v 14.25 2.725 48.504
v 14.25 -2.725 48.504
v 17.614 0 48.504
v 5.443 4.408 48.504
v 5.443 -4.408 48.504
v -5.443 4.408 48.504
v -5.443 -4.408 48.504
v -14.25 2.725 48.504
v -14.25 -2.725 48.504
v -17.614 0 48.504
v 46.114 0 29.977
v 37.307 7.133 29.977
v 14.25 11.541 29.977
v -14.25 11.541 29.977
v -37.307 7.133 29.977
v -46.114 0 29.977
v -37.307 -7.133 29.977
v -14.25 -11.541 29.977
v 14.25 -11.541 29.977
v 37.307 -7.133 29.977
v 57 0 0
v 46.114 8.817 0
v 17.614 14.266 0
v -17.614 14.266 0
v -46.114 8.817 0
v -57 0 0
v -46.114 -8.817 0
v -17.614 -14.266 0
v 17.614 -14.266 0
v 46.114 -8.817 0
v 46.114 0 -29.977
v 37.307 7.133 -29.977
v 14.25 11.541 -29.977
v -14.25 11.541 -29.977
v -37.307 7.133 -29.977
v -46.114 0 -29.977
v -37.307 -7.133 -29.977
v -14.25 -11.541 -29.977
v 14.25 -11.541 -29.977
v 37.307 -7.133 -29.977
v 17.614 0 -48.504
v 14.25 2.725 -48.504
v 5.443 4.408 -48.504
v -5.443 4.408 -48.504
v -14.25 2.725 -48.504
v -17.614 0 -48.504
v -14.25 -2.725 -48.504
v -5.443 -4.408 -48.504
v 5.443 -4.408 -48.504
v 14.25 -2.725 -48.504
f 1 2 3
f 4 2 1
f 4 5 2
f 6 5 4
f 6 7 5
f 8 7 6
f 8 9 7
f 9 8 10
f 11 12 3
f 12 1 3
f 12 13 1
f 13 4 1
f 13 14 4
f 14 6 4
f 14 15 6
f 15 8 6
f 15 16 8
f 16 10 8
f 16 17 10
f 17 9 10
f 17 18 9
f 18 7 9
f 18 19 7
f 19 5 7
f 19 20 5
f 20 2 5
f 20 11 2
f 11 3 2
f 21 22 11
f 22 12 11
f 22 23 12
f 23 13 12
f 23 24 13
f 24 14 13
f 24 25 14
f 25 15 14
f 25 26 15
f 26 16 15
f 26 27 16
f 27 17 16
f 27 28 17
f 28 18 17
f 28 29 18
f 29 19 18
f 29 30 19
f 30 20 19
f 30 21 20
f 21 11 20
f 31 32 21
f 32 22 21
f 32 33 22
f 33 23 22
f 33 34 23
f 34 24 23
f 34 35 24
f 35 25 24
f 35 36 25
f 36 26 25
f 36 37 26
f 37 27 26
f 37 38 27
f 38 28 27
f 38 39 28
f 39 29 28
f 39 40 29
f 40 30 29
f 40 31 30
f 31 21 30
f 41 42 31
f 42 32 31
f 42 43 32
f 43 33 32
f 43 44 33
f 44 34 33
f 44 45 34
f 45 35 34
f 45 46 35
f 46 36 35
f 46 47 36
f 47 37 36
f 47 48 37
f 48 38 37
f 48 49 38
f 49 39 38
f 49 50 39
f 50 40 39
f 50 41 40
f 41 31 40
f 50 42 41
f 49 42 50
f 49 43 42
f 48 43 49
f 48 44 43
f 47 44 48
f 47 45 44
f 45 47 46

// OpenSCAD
// Generated by SolidPython 1.0.1 on 2020-07-29 00:46:53


scale(v = [19, 5, 17]) {
	sphere(r = 3);
}
/***********************************************
*********      SolidPython code:      **********
************************************************
 
# import packages: SolidPython
from solid import *
from solid.utils import *
from itertools import chain, combinations, permutations


class Resize:

    def __init__(self, scad_file):
        self.scad_file = scad_file
        #self.scad_file = import_scad(scad_file)
        # cone/cylinder param:
        self.r1 = 0
        self.r2 = 0
        self.h = 0
        # rectangular prism param:
        self.w = 0
        self.l = 0
        # ellipse param:
        self.r = 0

    # import OpenScad code (file name corresponds to shape)


    # classify shape + parameters
    def assign(self, param1, param2, param3):
        if self.scad_file == 'cone.scad':
            self.r1 = param1
            self.r2 = param2
            self.h = param3
        elif self.scad_file == 'cylinder.scad':
            self.r1 = param1
            self.r2 = param2
            self.h = param3
        elif self.scad_file == 'rectangularPrism.scad':
            self.h = param1
            self.l = param2
            self.w = param3
        else:
            self.r = param1
            self.h = param2

    # resize parameters
    def iterate(self):
        x = range(3, 20, 2)
        i = 1
        if self.scad_file == 'cone.scad':
            tempList = list(permutations(x, 2))
            for temp in tempList:
                param1 = temp[0]
                param2 = temp[1]
                filepath = 'produced_scad_files/' + 'cone' + str(param1) + '_' + str(param2) + '_' + '.scad'
                scad_render_to_file(cylinder(h=param1, r1=param2, r2=0), filepath)

        elif self.scad_file == 'cylinder.scad':
            tempList = list(permutations(x, 3))
            for temp in tempList:
                param1 = temp[0]
                param2 = temp[1]
                filepath = 'produced_scad_files/' + 'cylinder' + str(param1) + '_' + str(param2) + '_' + '.scad'
                scad_render_to_file(cylinder(h=param1, r1=param2, r2=param2), filepath)

        elif self.scad_file == 'rectangularPrism.scad':
            tempList = list(permutations(x, 3))
            for temp in tempList:
                param1 = temp[0]
                param2 = temp[1]
                param3 = temp[2]
                filepath = 'produced_scad_files/' + 'rectangularPrism' + str(param1) + '_' + str(param2) + '_' + str(
                    param3) + '.scad'
                scad_render_to_file(cube(size=(param1, param2, param3)), filepath)

        elif self.scad_file == 'ellipse.scad':
            tempList = list(permutations(x, 4))
            for temp in tempList:
                param1 = temp[0]
                param2 = temp[1]
                param3 = temp[2]
                param4 = temp[3]
                filepath = 'produced_scad_files/' + 'ellipse' + str(param1) + '_' + str(param2) + '_' + str(param3) + '_' + str(param4) + '.scad'
                scad_render_to_file(scale([param1, param2, param3])(sphere(r=param4)), filepath)

    def render_to_scadfile(self):
        scad_render_to_file(scad, 'example.scad') 
 
************************************************/
